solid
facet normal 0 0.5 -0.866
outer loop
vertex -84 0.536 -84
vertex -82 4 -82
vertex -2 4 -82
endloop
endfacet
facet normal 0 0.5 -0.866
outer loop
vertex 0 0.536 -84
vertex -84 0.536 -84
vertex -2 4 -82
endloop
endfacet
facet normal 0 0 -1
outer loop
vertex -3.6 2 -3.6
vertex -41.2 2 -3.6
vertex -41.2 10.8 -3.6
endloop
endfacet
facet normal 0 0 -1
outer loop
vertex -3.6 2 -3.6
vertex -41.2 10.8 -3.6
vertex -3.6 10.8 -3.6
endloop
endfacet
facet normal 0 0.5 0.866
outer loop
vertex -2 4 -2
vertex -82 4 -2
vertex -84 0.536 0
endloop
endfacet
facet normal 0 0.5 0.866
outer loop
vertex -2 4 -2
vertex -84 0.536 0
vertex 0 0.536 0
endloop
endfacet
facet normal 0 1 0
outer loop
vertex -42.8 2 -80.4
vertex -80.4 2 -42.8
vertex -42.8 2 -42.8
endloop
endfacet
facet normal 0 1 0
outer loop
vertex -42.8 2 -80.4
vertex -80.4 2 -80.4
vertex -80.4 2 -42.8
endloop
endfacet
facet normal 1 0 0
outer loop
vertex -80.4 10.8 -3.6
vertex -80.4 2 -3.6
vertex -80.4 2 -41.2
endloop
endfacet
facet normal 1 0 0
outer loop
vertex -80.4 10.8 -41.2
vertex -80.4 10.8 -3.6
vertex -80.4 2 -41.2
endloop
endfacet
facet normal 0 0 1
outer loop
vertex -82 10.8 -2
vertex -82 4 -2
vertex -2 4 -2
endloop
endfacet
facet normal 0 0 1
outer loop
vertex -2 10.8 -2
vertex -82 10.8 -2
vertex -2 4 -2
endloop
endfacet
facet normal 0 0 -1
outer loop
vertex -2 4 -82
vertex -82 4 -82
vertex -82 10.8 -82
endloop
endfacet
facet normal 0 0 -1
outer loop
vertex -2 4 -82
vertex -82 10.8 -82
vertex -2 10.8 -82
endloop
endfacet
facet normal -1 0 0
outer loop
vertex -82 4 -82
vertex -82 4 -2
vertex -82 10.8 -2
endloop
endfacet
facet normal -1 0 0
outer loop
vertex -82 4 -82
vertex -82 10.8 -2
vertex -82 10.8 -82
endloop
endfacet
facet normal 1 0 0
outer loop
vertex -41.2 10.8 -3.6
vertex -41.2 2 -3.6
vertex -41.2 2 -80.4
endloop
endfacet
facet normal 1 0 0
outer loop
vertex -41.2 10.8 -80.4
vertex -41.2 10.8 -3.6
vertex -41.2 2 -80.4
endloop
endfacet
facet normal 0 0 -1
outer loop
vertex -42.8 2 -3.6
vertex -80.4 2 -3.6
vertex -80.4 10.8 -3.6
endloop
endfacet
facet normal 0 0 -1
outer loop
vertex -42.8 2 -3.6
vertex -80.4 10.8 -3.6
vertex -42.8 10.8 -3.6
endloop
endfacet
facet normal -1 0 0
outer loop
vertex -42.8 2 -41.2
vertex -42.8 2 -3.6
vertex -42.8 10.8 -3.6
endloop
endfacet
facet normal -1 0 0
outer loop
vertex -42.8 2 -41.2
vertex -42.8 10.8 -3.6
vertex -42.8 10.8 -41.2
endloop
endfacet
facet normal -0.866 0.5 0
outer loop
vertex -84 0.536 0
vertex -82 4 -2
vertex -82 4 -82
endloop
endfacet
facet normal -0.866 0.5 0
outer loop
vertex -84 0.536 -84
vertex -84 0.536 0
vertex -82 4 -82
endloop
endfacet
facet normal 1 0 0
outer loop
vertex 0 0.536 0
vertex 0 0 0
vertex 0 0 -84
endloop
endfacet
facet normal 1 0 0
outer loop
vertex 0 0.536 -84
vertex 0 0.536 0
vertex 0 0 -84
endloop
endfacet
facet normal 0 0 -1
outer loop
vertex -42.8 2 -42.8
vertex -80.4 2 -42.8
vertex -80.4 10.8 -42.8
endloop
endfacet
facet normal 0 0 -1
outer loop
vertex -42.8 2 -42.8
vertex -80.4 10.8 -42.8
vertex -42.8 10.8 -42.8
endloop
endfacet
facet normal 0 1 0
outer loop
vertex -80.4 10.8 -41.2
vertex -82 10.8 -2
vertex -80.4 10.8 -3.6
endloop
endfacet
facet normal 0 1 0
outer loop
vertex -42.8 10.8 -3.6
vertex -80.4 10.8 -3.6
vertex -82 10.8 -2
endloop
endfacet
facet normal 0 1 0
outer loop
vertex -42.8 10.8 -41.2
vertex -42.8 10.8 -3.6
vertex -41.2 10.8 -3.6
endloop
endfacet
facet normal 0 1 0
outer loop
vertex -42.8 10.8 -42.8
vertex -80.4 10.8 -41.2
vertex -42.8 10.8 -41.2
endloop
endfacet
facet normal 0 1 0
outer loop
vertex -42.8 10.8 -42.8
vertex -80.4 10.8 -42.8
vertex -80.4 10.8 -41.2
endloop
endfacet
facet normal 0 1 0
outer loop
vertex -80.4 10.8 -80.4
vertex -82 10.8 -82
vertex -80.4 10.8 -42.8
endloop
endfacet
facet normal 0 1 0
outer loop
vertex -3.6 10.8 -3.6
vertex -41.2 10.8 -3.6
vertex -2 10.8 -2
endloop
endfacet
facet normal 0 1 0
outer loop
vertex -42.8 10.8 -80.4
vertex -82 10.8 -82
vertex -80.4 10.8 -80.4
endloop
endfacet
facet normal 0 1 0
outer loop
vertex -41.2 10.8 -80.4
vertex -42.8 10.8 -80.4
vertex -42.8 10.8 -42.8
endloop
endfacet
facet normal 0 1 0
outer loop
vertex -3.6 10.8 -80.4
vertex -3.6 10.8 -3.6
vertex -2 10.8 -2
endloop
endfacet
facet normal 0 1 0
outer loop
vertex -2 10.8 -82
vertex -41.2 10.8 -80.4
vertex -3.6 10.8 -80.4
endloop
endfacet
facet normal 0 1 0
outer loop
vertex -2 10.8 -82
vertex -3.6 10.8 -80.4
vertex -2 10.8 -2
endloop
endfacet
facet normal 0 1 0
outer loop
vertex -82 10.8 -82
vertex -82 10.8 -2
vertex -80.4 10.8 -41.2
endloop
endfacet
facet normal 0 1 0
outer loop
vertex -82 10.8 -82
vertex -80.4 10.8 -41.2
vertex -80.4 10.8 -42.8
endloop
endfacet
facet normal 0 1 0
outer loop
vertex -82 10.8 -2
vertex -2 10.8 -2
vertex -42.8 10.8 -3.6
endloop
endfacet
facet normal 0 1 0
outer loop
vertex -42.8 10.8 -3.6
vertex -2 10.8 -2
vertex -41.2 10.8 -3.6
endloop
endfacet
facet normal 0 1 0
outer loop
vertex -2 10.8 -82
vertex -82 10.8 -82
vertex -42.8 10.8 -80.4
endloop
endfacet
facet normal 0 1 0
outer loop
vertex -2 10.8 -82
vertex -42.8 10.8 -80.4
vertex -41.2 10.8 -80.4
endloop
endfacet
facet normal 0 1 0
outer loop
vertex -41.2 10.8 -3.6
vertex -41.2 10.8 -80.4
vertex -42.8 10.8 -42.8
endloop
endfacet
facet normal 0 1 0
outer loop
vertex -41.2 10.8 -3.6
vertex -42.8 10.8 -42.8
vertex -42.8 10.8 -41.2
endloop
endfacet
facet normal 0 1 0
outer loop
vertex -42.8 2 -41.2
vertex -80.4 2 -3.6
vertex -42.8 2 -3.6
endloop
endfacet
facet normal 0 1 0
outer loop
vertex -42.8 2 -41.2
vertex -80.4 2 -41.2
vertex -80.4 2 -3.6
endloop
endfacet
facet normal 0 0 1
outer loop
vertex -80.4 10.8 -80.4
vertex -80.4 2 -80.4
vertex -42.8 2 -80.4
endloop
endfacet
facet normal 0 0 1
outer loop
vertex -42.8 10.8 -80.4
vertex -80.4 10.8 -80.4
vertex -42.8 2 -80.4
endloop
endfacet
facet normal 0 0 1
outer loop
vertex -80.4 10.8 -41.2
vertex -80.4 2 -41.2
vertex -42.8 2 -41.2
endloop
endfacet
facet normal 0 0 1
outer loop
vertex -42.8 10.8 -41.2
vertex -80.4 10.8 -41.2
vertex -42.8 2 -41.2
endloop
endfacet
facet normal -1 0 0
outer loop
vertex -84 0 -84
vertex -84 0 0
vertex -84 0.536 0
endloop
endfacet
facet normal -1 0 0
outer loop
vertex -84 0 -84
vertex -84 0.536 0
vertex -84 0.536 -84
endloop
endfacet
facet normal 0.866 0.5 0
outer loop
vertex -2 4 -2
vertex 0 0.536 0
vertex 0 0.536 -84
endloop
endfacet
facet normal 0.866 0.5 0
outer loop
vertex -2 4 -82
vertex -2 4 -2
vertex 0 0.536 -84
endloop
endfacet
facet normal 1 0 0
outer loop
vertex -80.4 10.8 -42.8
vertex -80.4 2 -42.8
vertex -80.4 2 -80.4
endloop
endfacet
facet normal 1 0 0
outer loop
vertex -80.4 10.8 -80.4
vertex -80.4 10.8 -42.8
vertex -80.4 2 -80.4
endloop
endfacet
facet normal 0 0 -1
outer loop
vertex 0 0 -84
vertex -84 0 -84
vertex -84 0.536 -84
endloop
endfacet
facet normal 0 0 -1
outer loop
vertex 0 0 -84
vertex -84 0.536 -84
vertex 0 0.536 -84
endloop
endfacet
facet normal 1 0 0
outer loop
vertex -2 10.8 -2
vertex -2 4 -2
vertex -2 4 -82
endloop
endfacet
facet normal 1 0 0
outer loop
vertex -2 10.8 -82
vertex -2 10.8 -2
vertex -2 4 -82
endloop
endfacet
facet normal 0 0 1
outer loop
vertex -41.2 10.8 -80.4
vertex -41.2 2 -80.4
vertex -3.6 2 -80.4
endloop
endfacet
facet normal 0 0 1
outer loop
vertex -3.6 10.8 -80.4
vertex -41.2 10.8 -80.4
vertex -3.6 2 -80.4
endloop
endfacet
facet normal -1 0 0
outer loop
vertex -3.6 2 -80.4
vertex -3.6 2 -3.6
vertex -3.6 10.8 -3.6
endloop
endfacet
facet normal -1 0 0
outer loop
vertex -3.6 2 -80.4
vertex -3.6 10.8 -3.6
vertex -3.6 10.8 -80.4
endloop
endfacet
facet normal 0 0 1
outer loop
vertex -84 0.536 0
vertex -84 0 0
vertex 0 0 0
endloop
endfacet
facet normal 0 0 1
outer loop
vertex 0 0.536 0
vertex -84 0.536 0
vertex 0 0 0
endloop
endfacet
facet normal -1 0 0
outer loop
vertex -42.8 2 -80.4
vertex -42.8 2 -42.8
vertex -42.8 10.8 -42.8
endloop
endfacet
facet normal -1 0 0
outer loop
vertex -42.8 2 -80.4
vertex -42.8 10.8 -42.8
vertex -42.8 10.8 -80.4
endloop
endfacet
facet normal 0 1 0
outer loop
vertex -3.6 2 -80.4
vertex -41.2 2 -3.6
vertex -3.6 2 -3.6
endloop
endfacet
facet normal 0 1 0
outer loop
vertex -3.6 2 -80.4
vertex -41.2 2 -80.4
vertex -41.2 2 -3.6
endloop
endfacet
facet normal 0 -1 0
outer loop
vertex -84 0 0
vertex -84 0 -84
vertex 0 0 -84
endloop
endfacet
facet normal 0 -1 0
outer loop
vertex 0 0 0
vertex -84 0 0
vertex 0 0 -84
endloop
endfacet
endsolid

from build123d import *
from OCP.BRepFilletAPI import BRepFilletAPI_MakeChamfer

# Parameters (mm, degrees)
SKICA1_W                = 84
SKICA1_H                = 84
P_IDAT_VYSUNUT_M1_DEPTH = 2
SKICA1_3_W              = 80
SKICA1_3_H              = 80
SKICA1_3_W_2            = 37.6
SKICA1_3_H_2            = 76.8
SKICA1_3_H_3            = 37.6
P_IDAT_VYSUNUT_M2_DEPTH = 10.8
SKICA1_4_W              = 84
SKICA1_4_H              = 84
SKICA1_4_W_2            = 80
SKICA1_4_H_2            = 80
P_IDAT_VYSUNUT_M3_DEPTH = 4
ZKOSEN_2_SIZE           = 3.464101615
ZKOSEN_2_SIZE_2         = 2


with BuildPart() as part:
    # Skica1 → Přidat vysunutím1 (new body)
    with BuildSketch(Plane(origin=(0, 0, 0), x_dir=(1, 0, 0), z_dir=(0, 1, 0))):
        with Locations((-42, 42)):
            Rectangle(SKICA1_W, SKICA1_H)
    extrude(amount=P_IDAT_VYSUNUT_M1_DEPTH)

    # Skica1<3> → Přidat vysunutím2 (add)
    with BuildSketch(Plane(origin=(0, 0, 0), x_dir=(1, 0, 0), z_dir=(0, 1, 0))):
        with Locations((-42, 42)):
            Rectangle(SKICA1_3_W, SKICA1_3_H)
        with Locations((-22.4, 42)):
            Rectangle(SKICA1_3_W_2, SKICA1_3_H_2, mode=Mode.SUBTRACT)
        with Locations((-61.6, 61.6)):
            Rectangle(SKICA1_3_W_2, SKICA1_3_H_3, mode=Mode.SUBTRACT)
        with Locations((-61.6, 22.4)):
            Rectangle(SKICA1_3_W_2, SKICA1_3_H_3, mode=Mode.SUBTRACT)
    extrude(amount=P_IDAT_VYSUNUT_M2_DEPTH)

    # Skica1<4> → Přidat vysunutím3 (add)
    with BuildSketch(Plane(origin=(0, 0, 0), x_dir=(1, 0, 0), z_dir=(0, 1, 0))):
        with Locations((-42, 42)):
            Rectangle(SKICA1_4_W, SKICA1_4_H)
        with Locations((-42, 42)):
            Rectangle(SKICA1_4_W_2, SKICA1_4_H_2, mode=Mode.SUBTRACT)
    extrude(amount=P_IDAT_VYSUNUT_M3_DEPTH)

    # Zkosení2
    zkosen_2_edges_1 = [part.edges().sort_by_distance(p)[0] for p in [
        (-84, 4, -42),
    ]]
    zkosen_2_side_1 = [part.faces().sort_by_distance(p)[0] for p in [
        (-84, 3.96, -42),
    ]]
    zkosen_2_edges_2 = [part.edges().sort_by_distance(p)[0] for p in [
        (-42, 4, 0),
    ]]
    zkosen_2_side_2 = [part.faces().sort_by_distance(p)[0] for p in [
        (-42, 3.96, 0),
    ]]
    zkosen_2_edges_3 = [part.edges().sort_by_distance(p)[0] for p in [
        (0, 4, -42),
    ]]
    zkosen_2_side_3 = [part.faces().sort_by_distance(p)[0] for p in [
        (-0.04, 4, -42),
    ]]
    zkosen_2_edges_4 = [part.edges().sort_by_distance(p)[0] for p in [
        (-42, 4, -84),
    ]]
    zkosen_2_side_4 = [part.faces().sort_by_distance(p)[0] for p in [
        (-42, 3.96, -84),
    ]]
    zkosen_2 = BRepFilletAPI_MakeChamfer(part.part.solid().wrapped)
    for e in zkosen_2_edges_1:
        zkosen_2.Add(ZKOSEN_2_SIZE - 0.0001, ZKOSEN_2_SIZE_2 - 0.0001, e.wrapped, zkosen_2_side_1[0].wrapped)
    for e in zkosen_2_edges_2:
        zkosen_2.Add(ZKOSEN_2_SIZE - 0.0001, ZKOSEN_2_SIZE_2 - 0.0001, e.wrapped, zkosen_2_side_2[0].wrapped)
    for e in zkosen_2_edges_3:
        zkosen_2.Add(ZKOSEN_2_SIZE_2 - 0.0001, ZKOSEN_2_SIZE - 0.0001, e.wrapped, zkosen_2_side_3[0].wrapped)
    for e in zkosen_2_edges_4:
        zkosen_2.Add(ZKOSEN_2_SIZE - 0.0001, ZKOSEN_2_SIZE_2 - 0.0001, e.wrapped, zkosen_2_side_4[0].wrapped)
    add(Compound.cast(zkosen_2.Shape()), mode=Mode.REPLACE)  # a hair under: the kernel refuses the full size


solid = part.part
